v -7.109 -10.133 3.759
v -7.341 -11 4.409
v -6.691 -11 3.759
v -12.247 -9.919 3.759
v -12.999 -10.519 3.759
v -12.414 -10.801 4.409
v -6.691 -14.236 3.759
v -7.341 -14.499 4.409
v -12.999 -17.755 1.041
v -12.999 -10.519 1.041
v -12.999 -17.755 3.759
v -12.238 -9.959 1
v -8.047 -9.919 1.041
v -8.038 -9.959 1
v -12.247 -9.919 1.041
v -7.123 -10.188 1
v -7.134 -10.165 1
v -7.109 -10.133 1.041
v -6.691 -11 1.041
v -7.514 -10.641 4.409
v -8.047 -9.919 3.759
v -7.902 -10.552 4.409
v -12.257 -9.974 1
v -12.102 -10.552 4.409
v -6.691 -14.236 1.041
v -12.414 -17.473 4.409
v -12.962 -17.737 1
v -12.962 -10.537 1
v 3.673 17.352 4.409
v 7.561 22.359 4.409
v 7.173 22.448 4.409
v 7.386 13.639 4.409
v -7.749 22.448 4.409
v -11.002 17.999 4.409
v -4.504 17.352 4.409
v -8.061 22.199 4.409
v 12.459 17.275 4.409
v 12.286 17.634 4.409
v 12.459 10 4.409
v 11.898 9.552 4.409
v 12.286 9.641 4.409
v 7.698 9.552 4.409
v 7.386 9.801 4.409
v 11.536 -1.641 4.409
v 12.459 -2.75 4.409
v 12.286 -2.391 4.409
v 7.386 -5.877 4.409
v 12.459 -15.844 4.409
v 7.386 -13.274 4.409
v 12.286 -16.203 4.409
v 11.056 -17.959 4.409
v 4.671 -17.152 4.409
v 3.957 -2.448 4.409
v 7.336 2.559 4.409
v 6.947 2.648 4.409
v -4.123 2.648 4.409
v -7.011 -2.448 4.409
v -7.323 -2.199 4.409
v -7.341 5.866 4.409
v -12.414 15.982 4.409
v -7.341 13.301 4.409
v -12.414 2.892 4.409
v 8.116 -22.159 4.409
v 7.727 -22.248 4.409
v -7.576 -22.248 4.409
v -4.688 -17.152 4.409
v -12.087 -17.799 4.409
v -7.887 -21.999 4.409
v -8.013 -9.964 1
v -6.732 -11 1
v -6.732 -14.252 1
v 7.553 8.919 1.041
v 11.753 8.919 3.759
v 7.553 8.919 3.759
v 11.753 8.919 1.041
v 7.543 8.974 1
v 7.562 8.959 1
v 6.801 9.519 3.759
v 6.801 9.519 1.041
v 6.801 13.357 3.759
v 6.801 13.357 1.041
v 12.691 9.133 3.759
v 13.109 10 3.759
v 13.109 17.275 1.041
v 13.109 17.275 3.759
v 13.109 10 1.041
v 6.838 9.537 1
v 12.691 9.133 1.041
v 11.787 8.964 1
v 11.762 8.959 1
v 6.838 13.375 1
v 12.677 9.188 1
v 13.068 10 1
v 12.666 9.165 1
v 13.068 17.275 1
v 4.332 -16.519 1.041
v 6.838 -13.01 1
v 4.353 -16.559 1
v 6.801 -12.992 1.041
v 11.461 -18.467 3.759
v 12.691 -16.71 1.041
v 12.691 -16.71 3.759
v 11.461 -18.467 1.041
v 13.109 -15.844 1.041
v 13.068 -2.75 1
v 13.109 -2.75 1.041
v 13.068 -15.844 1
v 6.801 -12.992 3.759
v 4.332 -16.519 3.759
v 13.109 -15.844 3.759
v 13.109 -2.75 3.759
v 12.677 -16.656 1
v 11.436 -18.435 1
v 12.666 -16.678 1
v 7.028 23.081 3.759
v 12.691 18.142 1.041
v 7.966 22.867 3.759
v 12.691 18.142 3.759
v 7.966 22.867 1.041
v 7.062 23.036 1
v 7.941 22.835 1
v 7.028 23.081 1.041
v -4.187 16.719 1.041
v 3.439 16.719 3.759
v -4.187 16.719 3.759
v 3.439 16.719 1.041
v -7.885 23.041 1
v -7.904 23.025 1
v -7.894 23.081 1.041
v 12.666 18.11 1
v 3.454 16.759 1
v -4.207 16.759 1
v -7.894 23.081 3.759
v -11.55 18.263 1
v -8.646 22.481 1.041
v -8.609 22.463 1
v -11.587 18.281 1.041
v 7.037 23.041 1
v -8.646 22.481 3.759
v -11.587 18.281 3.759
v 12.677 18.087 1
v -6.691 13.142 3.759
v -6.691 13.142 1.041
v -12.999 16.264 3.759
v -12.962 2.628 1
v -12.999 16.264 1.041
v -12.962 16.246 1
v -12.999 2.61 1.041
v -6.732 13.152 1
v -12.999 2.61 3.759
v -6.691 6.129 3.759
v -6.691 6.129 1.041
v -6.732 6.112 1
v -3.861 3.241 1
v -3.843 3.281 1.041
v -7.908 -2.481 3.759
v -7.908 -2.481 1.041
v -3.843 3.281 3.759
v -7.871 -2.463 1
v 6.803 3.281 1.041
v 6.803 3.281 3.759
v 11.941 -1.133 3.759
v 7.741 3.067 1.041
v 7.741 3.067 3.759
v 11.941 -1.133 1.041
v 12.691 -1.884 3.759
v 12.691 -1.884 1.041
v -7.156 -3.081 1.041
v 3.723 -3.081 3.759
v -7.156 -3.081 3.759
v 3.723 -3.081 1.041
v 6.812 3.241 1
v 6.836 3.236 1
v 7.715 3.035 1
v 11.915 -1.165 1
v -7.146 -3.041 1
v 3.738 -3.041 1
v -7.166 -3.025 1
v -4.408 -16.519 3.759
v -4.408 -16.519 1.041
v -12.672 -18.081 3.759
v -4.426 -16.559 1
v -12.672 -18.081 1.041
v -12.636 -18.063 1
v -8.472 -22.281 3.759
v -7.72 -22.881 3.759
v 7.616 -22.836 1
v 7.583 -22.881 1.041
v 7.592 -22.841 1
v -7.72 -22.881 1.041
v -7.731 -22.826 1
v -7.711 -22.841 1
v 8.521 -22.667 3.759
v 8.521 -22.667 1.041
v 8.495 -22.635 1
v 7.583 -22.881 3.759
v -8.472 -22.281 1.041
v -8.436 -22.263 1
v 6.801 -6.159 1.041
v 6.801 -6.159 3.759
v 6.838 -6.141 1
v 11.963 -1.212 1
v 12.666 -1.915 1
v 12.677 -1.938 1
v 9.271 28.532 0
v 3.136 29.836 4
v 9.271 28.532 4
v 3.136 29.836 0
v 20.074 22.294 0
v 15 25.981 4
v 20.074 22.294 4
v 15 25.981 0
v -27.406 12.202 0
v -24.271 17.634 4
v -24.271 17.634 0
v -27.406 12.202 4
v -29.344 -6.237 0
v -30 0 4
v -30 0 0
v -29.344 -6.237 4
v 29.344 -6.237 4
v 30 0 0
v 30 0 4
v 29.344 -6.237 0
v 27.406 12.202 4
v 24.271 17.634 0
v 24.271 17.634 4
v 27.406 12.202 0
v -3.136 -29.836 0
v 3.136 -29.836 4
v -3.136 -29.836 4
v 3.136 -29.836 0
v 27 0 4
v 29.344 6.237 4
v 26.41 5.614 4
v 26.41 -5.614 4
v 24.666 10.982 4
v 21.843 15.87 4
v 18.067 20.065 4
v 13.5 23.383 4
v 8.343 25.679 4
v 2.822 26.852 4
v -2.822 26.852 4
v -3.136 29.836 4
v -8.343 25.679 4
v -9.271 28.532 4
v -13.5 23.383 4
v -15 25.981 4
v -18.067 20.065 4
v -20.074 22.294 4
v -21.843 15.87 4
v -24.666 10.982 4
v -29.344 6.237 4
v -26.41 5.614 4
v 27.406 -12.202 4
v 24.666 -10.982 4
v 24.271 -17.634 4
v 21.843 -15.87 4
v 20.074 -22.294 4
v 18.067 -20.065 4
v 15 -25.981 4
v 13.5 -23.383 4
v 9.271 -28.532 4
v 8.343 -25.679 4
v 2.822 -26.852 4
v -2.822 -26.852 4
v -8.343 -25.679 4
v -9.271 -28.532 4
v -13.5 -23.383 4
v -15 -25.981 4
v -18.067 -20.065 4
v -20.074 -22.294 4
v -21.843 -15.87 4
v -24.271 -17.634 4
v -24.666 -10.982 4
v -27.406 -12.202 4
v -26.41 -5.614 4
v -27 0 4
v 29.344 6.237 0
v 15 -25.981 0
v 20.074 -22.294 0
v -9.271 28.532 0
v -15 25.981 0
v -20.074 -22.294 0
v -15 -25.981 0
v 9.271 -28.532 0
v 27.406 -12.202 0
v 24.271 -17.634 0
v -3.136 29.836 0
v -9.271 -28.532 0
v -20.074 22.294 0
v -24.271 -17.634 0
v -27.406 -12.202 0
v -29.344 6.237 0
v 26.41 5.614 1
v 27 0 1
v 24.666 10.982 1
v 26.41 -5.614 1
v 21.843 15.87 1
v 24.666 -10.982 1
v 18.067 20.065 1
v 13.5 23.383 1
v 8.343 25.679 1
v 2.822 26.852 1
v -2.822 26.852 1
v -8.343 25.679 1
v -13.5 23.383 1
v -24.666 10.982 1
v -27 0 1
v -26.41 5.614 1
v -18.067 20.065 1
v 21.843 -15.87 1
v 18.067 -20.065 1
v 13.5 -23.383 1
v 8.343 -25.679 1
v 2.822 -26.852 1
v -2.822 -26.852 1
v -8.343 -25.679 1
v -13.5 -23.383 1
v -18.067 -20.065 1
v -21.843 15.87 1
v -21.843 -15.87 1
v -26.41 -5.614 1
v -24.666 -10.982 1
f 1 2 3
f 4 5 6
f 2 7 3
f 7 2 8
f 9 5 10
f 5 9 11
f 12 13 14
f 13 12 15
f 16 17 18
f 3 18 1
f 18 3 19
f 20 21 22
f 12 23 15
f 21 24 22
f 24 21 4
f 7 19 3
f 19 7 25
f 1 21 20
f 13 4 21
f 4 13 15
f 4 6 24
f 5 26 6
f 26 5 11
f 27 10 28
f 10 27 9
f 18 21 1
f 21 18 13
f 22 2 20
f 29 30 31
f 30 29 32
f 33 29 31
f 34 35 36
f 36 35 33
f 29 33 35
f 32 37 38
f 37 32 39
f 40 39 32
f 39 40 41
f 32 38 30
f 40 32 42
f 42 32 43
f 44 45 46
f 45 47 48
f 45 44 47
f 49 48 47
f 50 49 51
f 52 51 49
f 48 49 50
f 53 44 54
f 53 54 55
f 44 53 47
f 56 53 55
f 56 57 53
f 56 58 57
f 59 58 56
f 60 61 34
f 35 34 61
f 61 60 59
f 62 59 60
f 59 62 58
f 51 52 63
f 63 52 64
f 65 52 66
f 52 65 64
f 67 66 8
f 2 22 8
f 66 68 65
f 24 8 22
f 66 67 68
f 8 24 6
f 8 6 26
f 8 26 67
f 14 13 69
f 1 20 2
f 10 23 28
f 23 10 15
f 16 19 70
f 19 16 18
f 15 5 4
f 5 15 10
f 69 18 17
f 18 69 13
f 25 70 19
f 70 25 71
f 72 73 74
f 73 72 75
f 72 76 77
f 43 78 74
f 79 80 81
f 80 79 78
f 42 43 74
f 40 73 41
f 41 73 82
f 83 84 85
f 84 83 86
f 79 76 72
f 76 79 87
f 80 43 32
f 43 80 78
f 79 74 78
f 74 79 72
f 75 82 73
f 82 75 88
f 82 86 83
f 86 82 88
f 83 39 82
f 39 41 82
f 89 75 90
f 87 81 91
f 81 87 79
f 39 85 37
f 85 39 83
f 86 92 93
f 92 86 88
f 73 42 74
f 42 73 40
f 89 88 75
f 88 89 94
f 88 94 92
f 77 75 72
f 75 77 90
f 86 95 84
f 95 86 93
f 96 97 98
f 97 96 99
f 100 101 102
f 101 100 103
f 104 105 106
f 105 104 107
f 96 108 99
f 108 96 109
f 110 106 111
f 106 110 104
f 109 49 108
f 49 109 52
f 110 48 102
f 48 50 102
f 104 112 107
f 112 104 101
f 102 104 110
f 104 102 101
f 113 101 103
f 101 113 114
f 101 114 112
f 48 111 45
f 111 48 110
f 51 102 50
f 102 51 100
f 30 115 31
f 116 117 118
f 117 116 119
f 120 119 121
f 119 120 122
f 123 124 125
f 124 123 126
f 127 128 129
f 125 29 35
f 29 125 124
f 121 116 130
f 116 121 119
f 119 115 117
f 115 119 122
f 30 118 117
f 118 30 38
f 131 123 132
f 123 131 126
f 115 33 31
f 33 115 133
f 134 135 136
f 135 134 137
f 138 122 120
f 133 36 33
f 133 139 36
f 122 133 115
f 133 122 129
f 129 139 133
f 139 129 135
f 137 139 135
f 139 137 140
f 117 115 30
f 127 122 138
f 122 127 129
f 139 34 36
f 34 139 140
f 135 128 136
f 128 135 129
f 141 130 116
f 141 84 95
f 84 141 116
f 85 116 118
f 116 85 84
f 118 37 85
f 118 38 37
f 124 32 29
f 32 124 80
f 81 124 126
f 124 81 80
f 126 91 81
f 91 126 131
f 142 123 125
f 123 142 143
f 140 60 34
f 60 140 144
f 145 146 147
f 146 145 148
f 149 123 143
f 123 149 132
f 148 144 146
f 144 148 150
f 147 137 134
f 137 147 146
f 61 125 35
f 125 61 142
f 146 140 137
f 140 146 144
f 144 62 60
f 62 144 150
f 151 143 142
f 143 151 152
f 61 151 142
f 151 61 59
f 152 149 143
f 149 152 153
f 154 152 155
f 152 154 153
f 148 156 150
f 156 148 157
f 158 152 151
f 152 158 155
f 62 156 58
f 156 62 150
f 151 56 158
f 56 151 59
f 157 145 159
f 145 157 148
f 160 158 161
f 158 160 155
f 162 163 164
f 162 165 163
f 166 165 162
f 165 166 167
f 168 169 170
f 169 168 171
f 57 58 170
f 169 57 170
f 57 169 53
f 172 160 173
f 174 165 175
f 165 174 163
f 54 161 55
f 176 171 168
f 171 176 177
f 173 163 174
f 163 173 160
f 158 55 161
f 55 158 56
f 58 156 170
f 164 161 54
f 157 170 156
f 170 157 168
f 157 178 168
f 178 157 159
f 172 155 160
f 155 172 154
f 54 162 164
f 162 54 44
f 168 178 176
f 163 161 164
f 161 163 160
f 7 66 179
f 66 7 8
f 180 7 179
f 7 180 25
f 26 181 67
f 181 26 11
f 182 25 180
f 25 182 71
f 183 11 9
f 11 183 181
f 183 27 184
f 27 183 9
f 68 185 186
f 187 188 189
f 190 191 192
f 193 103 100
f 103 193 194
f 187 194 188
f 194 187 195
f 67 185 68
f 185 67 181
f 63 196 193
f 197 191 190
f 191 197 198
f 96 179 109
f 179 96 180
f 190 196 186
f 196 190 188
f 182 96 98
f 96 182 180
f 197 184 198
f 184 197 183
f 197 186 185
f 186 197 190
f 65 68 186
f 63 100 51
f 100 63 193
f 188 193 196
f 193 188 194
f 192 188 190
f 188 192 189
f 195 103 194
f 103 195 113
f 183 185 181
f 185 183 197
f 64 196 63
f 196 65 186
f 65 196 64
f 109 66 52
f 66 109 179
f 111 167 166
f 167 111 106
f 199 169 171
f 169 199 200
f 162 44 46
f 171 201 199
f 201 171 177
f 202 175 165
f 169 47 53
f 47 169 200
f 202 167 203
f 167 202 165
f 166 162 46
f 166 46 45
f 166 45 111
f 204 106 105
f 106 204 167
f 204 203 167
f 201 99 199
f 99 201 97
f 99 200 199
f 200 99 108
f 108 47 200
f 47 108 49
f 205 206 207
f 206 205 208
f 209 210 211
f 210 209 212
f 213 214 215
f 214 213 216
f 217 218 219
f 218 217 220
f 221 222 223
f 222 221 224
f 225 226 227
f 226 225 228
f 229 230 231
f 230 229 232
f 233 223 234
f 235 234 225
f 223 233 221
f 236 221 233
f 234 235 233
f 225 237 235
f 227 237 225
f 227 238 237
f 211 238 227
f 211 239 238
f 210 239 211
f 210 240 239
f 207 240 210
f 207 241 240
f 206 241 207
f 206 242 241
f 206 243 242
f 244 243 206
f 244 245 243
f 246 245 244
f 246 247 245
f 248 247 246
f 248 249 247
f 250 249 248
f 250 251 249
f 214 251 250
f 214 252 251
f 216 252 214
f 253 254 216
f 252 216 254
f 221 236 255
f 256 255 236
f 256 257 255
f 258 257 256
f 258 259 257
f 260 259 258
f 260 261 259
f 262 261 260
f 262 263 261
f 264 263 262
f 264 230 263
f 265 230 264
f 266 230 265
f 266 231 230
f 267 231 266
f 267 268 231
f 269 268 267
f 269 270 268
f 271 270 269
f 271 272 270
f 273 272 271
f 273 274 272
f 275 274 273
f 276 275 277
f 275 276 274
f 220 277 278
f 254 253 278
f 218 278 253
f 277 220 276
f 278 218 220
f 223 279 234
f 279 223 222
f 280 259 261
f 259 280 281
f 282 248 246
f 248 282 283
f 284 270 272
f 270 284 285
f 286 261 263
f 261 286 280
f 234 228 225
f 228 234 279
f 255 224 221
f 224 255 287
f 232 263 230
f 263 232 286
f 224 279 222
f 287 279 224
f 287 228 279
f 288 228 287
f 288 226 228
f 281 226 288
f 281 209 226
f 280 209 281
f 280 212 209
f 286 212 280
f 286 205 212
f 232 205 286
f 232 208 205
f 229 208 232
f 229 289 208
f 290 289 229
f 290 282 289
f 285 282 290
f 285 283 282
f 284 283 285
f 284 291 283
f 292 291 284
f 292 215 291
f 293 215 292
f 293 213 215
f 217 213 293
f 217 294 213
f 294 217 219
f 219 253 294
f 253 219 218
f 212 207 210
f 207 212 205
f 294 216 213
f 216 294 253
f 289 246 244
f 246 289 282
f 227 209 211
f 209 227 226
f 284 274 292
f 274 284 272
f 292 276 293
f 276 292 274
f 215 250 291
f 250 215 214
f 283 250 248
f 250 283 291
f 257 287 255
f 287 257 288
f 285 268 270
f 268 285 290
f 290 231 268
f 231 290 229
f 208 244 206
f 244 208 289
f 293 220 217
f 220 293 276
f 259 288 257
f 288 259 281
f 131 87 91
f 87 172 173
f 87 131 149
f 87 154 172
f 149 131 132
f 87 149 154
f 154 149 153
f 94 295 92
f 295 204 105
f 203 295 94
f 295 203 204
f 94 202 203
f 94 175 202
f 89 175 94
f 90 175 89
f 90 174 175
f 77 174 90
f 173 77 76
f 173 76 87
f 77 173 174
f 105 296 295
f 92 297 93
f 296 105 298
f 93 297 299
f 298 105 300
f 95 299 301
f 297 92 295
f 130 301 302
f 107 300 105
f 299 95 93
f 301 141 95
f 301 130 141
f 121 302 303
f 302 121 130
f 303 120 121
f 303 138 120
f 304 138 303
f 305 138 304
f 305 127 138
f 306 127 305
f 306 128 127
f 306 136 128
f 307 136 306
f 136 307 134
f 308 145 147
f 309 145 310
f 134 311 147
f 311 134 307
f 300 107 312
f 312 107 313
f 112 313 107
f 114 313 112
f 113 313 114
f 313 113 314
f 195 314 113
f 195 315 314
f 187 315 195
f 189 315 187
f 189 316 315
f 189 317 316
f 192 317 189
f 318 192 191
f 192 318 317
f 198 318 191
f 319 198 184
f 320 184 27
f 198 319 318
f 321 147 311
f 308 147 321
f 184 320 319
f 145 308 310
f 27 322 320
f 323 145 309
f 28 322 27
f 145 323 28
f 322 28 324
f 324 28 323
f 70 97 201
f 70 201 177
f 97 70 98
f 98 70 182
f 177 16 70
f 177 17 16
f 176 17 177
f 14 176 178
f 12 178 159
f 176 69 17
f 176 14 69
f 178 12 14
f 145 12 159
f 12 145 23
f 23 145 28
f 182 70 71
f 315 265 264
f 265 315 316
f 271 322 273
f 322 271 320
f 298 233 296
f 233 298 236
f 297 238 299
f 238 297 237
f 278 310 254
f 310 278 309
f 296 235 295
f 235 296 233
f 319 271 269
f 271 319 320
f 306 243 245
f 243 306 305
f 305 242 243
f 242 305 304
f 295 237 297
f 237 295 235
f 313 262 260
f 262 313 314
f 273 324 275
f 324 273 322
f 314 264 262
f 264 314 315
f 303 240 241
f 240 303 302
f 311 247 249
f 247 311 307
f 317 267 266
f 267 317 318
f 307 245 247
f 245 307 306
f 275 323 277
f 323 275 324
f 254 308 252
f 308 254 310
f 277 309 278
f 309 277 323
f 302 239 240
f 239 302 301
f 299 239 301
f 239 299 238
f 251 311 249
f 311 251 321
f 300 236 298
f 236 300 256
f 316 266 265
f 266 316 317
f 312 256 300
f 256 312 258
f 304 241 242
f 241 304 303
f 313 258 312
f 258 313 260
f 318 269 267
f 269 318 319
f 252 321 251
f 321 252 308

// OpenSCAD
translate([-12,-2,1.5]) scale([0.6,0.6,0.6]){
 minkowski(){
  difference(){
   union(){

	rotate([0,0,135]) translate([-5,-14,0]) cube([10,6,3]);
	rotate([0,0,135]) translate([-28,-25,0]) cube([10,6,3]);
	rotate([0,0,135]) translate([-30,10,0]) cube([10,6,3]);
	rotate([0,0,135]) translate([-5,-48,0]) cube([10,6,3]);
	rotate([0,0,235]) translate([-5,38,0]) cube([10,6,3]);
	rotate([0,0,235]) translate([-35,-15,0]) cube([10,6,3]);

	cube([40,7,3]);
	cube([7,40,3]);
	translate([0,33,0]) cube([40,7,3]);
	translate([33,20,0]) cube([7,15,3]);
	translate([0,-30,0]) cube([7,15,3]);
	translate([33,-33,0]) cube([7,40,3]);
	translate([0,-33,0]) cube([40,7,3]);

}   //union

	rotate([0,0,135]) translate([-8,-6,-1]) cube([15,6,5]);
	rotate([0,0,135]) translate([-30,-33.4,-1]) cube([15,6,5]);
	rotate([0,0,135]) translate([-30,18,-1]) cube([15,6,5]);
	rotate([0,0,135]) translate([-7,-57,-1]) cube([15,6,5]);
	rotate([0,0,235]) translate([-5,46,-1]) cube([15,6,5]);
	rotate([0,0,235]) translate([-37,-23,-1]) cube([15,6,5]);

}   //difference
 sphere(2);
} //monkowski
}	//scale
 difference(){
	cylinder(4,30,30);
	translate([0,0,1]) cylinder(4,27,27);
}
